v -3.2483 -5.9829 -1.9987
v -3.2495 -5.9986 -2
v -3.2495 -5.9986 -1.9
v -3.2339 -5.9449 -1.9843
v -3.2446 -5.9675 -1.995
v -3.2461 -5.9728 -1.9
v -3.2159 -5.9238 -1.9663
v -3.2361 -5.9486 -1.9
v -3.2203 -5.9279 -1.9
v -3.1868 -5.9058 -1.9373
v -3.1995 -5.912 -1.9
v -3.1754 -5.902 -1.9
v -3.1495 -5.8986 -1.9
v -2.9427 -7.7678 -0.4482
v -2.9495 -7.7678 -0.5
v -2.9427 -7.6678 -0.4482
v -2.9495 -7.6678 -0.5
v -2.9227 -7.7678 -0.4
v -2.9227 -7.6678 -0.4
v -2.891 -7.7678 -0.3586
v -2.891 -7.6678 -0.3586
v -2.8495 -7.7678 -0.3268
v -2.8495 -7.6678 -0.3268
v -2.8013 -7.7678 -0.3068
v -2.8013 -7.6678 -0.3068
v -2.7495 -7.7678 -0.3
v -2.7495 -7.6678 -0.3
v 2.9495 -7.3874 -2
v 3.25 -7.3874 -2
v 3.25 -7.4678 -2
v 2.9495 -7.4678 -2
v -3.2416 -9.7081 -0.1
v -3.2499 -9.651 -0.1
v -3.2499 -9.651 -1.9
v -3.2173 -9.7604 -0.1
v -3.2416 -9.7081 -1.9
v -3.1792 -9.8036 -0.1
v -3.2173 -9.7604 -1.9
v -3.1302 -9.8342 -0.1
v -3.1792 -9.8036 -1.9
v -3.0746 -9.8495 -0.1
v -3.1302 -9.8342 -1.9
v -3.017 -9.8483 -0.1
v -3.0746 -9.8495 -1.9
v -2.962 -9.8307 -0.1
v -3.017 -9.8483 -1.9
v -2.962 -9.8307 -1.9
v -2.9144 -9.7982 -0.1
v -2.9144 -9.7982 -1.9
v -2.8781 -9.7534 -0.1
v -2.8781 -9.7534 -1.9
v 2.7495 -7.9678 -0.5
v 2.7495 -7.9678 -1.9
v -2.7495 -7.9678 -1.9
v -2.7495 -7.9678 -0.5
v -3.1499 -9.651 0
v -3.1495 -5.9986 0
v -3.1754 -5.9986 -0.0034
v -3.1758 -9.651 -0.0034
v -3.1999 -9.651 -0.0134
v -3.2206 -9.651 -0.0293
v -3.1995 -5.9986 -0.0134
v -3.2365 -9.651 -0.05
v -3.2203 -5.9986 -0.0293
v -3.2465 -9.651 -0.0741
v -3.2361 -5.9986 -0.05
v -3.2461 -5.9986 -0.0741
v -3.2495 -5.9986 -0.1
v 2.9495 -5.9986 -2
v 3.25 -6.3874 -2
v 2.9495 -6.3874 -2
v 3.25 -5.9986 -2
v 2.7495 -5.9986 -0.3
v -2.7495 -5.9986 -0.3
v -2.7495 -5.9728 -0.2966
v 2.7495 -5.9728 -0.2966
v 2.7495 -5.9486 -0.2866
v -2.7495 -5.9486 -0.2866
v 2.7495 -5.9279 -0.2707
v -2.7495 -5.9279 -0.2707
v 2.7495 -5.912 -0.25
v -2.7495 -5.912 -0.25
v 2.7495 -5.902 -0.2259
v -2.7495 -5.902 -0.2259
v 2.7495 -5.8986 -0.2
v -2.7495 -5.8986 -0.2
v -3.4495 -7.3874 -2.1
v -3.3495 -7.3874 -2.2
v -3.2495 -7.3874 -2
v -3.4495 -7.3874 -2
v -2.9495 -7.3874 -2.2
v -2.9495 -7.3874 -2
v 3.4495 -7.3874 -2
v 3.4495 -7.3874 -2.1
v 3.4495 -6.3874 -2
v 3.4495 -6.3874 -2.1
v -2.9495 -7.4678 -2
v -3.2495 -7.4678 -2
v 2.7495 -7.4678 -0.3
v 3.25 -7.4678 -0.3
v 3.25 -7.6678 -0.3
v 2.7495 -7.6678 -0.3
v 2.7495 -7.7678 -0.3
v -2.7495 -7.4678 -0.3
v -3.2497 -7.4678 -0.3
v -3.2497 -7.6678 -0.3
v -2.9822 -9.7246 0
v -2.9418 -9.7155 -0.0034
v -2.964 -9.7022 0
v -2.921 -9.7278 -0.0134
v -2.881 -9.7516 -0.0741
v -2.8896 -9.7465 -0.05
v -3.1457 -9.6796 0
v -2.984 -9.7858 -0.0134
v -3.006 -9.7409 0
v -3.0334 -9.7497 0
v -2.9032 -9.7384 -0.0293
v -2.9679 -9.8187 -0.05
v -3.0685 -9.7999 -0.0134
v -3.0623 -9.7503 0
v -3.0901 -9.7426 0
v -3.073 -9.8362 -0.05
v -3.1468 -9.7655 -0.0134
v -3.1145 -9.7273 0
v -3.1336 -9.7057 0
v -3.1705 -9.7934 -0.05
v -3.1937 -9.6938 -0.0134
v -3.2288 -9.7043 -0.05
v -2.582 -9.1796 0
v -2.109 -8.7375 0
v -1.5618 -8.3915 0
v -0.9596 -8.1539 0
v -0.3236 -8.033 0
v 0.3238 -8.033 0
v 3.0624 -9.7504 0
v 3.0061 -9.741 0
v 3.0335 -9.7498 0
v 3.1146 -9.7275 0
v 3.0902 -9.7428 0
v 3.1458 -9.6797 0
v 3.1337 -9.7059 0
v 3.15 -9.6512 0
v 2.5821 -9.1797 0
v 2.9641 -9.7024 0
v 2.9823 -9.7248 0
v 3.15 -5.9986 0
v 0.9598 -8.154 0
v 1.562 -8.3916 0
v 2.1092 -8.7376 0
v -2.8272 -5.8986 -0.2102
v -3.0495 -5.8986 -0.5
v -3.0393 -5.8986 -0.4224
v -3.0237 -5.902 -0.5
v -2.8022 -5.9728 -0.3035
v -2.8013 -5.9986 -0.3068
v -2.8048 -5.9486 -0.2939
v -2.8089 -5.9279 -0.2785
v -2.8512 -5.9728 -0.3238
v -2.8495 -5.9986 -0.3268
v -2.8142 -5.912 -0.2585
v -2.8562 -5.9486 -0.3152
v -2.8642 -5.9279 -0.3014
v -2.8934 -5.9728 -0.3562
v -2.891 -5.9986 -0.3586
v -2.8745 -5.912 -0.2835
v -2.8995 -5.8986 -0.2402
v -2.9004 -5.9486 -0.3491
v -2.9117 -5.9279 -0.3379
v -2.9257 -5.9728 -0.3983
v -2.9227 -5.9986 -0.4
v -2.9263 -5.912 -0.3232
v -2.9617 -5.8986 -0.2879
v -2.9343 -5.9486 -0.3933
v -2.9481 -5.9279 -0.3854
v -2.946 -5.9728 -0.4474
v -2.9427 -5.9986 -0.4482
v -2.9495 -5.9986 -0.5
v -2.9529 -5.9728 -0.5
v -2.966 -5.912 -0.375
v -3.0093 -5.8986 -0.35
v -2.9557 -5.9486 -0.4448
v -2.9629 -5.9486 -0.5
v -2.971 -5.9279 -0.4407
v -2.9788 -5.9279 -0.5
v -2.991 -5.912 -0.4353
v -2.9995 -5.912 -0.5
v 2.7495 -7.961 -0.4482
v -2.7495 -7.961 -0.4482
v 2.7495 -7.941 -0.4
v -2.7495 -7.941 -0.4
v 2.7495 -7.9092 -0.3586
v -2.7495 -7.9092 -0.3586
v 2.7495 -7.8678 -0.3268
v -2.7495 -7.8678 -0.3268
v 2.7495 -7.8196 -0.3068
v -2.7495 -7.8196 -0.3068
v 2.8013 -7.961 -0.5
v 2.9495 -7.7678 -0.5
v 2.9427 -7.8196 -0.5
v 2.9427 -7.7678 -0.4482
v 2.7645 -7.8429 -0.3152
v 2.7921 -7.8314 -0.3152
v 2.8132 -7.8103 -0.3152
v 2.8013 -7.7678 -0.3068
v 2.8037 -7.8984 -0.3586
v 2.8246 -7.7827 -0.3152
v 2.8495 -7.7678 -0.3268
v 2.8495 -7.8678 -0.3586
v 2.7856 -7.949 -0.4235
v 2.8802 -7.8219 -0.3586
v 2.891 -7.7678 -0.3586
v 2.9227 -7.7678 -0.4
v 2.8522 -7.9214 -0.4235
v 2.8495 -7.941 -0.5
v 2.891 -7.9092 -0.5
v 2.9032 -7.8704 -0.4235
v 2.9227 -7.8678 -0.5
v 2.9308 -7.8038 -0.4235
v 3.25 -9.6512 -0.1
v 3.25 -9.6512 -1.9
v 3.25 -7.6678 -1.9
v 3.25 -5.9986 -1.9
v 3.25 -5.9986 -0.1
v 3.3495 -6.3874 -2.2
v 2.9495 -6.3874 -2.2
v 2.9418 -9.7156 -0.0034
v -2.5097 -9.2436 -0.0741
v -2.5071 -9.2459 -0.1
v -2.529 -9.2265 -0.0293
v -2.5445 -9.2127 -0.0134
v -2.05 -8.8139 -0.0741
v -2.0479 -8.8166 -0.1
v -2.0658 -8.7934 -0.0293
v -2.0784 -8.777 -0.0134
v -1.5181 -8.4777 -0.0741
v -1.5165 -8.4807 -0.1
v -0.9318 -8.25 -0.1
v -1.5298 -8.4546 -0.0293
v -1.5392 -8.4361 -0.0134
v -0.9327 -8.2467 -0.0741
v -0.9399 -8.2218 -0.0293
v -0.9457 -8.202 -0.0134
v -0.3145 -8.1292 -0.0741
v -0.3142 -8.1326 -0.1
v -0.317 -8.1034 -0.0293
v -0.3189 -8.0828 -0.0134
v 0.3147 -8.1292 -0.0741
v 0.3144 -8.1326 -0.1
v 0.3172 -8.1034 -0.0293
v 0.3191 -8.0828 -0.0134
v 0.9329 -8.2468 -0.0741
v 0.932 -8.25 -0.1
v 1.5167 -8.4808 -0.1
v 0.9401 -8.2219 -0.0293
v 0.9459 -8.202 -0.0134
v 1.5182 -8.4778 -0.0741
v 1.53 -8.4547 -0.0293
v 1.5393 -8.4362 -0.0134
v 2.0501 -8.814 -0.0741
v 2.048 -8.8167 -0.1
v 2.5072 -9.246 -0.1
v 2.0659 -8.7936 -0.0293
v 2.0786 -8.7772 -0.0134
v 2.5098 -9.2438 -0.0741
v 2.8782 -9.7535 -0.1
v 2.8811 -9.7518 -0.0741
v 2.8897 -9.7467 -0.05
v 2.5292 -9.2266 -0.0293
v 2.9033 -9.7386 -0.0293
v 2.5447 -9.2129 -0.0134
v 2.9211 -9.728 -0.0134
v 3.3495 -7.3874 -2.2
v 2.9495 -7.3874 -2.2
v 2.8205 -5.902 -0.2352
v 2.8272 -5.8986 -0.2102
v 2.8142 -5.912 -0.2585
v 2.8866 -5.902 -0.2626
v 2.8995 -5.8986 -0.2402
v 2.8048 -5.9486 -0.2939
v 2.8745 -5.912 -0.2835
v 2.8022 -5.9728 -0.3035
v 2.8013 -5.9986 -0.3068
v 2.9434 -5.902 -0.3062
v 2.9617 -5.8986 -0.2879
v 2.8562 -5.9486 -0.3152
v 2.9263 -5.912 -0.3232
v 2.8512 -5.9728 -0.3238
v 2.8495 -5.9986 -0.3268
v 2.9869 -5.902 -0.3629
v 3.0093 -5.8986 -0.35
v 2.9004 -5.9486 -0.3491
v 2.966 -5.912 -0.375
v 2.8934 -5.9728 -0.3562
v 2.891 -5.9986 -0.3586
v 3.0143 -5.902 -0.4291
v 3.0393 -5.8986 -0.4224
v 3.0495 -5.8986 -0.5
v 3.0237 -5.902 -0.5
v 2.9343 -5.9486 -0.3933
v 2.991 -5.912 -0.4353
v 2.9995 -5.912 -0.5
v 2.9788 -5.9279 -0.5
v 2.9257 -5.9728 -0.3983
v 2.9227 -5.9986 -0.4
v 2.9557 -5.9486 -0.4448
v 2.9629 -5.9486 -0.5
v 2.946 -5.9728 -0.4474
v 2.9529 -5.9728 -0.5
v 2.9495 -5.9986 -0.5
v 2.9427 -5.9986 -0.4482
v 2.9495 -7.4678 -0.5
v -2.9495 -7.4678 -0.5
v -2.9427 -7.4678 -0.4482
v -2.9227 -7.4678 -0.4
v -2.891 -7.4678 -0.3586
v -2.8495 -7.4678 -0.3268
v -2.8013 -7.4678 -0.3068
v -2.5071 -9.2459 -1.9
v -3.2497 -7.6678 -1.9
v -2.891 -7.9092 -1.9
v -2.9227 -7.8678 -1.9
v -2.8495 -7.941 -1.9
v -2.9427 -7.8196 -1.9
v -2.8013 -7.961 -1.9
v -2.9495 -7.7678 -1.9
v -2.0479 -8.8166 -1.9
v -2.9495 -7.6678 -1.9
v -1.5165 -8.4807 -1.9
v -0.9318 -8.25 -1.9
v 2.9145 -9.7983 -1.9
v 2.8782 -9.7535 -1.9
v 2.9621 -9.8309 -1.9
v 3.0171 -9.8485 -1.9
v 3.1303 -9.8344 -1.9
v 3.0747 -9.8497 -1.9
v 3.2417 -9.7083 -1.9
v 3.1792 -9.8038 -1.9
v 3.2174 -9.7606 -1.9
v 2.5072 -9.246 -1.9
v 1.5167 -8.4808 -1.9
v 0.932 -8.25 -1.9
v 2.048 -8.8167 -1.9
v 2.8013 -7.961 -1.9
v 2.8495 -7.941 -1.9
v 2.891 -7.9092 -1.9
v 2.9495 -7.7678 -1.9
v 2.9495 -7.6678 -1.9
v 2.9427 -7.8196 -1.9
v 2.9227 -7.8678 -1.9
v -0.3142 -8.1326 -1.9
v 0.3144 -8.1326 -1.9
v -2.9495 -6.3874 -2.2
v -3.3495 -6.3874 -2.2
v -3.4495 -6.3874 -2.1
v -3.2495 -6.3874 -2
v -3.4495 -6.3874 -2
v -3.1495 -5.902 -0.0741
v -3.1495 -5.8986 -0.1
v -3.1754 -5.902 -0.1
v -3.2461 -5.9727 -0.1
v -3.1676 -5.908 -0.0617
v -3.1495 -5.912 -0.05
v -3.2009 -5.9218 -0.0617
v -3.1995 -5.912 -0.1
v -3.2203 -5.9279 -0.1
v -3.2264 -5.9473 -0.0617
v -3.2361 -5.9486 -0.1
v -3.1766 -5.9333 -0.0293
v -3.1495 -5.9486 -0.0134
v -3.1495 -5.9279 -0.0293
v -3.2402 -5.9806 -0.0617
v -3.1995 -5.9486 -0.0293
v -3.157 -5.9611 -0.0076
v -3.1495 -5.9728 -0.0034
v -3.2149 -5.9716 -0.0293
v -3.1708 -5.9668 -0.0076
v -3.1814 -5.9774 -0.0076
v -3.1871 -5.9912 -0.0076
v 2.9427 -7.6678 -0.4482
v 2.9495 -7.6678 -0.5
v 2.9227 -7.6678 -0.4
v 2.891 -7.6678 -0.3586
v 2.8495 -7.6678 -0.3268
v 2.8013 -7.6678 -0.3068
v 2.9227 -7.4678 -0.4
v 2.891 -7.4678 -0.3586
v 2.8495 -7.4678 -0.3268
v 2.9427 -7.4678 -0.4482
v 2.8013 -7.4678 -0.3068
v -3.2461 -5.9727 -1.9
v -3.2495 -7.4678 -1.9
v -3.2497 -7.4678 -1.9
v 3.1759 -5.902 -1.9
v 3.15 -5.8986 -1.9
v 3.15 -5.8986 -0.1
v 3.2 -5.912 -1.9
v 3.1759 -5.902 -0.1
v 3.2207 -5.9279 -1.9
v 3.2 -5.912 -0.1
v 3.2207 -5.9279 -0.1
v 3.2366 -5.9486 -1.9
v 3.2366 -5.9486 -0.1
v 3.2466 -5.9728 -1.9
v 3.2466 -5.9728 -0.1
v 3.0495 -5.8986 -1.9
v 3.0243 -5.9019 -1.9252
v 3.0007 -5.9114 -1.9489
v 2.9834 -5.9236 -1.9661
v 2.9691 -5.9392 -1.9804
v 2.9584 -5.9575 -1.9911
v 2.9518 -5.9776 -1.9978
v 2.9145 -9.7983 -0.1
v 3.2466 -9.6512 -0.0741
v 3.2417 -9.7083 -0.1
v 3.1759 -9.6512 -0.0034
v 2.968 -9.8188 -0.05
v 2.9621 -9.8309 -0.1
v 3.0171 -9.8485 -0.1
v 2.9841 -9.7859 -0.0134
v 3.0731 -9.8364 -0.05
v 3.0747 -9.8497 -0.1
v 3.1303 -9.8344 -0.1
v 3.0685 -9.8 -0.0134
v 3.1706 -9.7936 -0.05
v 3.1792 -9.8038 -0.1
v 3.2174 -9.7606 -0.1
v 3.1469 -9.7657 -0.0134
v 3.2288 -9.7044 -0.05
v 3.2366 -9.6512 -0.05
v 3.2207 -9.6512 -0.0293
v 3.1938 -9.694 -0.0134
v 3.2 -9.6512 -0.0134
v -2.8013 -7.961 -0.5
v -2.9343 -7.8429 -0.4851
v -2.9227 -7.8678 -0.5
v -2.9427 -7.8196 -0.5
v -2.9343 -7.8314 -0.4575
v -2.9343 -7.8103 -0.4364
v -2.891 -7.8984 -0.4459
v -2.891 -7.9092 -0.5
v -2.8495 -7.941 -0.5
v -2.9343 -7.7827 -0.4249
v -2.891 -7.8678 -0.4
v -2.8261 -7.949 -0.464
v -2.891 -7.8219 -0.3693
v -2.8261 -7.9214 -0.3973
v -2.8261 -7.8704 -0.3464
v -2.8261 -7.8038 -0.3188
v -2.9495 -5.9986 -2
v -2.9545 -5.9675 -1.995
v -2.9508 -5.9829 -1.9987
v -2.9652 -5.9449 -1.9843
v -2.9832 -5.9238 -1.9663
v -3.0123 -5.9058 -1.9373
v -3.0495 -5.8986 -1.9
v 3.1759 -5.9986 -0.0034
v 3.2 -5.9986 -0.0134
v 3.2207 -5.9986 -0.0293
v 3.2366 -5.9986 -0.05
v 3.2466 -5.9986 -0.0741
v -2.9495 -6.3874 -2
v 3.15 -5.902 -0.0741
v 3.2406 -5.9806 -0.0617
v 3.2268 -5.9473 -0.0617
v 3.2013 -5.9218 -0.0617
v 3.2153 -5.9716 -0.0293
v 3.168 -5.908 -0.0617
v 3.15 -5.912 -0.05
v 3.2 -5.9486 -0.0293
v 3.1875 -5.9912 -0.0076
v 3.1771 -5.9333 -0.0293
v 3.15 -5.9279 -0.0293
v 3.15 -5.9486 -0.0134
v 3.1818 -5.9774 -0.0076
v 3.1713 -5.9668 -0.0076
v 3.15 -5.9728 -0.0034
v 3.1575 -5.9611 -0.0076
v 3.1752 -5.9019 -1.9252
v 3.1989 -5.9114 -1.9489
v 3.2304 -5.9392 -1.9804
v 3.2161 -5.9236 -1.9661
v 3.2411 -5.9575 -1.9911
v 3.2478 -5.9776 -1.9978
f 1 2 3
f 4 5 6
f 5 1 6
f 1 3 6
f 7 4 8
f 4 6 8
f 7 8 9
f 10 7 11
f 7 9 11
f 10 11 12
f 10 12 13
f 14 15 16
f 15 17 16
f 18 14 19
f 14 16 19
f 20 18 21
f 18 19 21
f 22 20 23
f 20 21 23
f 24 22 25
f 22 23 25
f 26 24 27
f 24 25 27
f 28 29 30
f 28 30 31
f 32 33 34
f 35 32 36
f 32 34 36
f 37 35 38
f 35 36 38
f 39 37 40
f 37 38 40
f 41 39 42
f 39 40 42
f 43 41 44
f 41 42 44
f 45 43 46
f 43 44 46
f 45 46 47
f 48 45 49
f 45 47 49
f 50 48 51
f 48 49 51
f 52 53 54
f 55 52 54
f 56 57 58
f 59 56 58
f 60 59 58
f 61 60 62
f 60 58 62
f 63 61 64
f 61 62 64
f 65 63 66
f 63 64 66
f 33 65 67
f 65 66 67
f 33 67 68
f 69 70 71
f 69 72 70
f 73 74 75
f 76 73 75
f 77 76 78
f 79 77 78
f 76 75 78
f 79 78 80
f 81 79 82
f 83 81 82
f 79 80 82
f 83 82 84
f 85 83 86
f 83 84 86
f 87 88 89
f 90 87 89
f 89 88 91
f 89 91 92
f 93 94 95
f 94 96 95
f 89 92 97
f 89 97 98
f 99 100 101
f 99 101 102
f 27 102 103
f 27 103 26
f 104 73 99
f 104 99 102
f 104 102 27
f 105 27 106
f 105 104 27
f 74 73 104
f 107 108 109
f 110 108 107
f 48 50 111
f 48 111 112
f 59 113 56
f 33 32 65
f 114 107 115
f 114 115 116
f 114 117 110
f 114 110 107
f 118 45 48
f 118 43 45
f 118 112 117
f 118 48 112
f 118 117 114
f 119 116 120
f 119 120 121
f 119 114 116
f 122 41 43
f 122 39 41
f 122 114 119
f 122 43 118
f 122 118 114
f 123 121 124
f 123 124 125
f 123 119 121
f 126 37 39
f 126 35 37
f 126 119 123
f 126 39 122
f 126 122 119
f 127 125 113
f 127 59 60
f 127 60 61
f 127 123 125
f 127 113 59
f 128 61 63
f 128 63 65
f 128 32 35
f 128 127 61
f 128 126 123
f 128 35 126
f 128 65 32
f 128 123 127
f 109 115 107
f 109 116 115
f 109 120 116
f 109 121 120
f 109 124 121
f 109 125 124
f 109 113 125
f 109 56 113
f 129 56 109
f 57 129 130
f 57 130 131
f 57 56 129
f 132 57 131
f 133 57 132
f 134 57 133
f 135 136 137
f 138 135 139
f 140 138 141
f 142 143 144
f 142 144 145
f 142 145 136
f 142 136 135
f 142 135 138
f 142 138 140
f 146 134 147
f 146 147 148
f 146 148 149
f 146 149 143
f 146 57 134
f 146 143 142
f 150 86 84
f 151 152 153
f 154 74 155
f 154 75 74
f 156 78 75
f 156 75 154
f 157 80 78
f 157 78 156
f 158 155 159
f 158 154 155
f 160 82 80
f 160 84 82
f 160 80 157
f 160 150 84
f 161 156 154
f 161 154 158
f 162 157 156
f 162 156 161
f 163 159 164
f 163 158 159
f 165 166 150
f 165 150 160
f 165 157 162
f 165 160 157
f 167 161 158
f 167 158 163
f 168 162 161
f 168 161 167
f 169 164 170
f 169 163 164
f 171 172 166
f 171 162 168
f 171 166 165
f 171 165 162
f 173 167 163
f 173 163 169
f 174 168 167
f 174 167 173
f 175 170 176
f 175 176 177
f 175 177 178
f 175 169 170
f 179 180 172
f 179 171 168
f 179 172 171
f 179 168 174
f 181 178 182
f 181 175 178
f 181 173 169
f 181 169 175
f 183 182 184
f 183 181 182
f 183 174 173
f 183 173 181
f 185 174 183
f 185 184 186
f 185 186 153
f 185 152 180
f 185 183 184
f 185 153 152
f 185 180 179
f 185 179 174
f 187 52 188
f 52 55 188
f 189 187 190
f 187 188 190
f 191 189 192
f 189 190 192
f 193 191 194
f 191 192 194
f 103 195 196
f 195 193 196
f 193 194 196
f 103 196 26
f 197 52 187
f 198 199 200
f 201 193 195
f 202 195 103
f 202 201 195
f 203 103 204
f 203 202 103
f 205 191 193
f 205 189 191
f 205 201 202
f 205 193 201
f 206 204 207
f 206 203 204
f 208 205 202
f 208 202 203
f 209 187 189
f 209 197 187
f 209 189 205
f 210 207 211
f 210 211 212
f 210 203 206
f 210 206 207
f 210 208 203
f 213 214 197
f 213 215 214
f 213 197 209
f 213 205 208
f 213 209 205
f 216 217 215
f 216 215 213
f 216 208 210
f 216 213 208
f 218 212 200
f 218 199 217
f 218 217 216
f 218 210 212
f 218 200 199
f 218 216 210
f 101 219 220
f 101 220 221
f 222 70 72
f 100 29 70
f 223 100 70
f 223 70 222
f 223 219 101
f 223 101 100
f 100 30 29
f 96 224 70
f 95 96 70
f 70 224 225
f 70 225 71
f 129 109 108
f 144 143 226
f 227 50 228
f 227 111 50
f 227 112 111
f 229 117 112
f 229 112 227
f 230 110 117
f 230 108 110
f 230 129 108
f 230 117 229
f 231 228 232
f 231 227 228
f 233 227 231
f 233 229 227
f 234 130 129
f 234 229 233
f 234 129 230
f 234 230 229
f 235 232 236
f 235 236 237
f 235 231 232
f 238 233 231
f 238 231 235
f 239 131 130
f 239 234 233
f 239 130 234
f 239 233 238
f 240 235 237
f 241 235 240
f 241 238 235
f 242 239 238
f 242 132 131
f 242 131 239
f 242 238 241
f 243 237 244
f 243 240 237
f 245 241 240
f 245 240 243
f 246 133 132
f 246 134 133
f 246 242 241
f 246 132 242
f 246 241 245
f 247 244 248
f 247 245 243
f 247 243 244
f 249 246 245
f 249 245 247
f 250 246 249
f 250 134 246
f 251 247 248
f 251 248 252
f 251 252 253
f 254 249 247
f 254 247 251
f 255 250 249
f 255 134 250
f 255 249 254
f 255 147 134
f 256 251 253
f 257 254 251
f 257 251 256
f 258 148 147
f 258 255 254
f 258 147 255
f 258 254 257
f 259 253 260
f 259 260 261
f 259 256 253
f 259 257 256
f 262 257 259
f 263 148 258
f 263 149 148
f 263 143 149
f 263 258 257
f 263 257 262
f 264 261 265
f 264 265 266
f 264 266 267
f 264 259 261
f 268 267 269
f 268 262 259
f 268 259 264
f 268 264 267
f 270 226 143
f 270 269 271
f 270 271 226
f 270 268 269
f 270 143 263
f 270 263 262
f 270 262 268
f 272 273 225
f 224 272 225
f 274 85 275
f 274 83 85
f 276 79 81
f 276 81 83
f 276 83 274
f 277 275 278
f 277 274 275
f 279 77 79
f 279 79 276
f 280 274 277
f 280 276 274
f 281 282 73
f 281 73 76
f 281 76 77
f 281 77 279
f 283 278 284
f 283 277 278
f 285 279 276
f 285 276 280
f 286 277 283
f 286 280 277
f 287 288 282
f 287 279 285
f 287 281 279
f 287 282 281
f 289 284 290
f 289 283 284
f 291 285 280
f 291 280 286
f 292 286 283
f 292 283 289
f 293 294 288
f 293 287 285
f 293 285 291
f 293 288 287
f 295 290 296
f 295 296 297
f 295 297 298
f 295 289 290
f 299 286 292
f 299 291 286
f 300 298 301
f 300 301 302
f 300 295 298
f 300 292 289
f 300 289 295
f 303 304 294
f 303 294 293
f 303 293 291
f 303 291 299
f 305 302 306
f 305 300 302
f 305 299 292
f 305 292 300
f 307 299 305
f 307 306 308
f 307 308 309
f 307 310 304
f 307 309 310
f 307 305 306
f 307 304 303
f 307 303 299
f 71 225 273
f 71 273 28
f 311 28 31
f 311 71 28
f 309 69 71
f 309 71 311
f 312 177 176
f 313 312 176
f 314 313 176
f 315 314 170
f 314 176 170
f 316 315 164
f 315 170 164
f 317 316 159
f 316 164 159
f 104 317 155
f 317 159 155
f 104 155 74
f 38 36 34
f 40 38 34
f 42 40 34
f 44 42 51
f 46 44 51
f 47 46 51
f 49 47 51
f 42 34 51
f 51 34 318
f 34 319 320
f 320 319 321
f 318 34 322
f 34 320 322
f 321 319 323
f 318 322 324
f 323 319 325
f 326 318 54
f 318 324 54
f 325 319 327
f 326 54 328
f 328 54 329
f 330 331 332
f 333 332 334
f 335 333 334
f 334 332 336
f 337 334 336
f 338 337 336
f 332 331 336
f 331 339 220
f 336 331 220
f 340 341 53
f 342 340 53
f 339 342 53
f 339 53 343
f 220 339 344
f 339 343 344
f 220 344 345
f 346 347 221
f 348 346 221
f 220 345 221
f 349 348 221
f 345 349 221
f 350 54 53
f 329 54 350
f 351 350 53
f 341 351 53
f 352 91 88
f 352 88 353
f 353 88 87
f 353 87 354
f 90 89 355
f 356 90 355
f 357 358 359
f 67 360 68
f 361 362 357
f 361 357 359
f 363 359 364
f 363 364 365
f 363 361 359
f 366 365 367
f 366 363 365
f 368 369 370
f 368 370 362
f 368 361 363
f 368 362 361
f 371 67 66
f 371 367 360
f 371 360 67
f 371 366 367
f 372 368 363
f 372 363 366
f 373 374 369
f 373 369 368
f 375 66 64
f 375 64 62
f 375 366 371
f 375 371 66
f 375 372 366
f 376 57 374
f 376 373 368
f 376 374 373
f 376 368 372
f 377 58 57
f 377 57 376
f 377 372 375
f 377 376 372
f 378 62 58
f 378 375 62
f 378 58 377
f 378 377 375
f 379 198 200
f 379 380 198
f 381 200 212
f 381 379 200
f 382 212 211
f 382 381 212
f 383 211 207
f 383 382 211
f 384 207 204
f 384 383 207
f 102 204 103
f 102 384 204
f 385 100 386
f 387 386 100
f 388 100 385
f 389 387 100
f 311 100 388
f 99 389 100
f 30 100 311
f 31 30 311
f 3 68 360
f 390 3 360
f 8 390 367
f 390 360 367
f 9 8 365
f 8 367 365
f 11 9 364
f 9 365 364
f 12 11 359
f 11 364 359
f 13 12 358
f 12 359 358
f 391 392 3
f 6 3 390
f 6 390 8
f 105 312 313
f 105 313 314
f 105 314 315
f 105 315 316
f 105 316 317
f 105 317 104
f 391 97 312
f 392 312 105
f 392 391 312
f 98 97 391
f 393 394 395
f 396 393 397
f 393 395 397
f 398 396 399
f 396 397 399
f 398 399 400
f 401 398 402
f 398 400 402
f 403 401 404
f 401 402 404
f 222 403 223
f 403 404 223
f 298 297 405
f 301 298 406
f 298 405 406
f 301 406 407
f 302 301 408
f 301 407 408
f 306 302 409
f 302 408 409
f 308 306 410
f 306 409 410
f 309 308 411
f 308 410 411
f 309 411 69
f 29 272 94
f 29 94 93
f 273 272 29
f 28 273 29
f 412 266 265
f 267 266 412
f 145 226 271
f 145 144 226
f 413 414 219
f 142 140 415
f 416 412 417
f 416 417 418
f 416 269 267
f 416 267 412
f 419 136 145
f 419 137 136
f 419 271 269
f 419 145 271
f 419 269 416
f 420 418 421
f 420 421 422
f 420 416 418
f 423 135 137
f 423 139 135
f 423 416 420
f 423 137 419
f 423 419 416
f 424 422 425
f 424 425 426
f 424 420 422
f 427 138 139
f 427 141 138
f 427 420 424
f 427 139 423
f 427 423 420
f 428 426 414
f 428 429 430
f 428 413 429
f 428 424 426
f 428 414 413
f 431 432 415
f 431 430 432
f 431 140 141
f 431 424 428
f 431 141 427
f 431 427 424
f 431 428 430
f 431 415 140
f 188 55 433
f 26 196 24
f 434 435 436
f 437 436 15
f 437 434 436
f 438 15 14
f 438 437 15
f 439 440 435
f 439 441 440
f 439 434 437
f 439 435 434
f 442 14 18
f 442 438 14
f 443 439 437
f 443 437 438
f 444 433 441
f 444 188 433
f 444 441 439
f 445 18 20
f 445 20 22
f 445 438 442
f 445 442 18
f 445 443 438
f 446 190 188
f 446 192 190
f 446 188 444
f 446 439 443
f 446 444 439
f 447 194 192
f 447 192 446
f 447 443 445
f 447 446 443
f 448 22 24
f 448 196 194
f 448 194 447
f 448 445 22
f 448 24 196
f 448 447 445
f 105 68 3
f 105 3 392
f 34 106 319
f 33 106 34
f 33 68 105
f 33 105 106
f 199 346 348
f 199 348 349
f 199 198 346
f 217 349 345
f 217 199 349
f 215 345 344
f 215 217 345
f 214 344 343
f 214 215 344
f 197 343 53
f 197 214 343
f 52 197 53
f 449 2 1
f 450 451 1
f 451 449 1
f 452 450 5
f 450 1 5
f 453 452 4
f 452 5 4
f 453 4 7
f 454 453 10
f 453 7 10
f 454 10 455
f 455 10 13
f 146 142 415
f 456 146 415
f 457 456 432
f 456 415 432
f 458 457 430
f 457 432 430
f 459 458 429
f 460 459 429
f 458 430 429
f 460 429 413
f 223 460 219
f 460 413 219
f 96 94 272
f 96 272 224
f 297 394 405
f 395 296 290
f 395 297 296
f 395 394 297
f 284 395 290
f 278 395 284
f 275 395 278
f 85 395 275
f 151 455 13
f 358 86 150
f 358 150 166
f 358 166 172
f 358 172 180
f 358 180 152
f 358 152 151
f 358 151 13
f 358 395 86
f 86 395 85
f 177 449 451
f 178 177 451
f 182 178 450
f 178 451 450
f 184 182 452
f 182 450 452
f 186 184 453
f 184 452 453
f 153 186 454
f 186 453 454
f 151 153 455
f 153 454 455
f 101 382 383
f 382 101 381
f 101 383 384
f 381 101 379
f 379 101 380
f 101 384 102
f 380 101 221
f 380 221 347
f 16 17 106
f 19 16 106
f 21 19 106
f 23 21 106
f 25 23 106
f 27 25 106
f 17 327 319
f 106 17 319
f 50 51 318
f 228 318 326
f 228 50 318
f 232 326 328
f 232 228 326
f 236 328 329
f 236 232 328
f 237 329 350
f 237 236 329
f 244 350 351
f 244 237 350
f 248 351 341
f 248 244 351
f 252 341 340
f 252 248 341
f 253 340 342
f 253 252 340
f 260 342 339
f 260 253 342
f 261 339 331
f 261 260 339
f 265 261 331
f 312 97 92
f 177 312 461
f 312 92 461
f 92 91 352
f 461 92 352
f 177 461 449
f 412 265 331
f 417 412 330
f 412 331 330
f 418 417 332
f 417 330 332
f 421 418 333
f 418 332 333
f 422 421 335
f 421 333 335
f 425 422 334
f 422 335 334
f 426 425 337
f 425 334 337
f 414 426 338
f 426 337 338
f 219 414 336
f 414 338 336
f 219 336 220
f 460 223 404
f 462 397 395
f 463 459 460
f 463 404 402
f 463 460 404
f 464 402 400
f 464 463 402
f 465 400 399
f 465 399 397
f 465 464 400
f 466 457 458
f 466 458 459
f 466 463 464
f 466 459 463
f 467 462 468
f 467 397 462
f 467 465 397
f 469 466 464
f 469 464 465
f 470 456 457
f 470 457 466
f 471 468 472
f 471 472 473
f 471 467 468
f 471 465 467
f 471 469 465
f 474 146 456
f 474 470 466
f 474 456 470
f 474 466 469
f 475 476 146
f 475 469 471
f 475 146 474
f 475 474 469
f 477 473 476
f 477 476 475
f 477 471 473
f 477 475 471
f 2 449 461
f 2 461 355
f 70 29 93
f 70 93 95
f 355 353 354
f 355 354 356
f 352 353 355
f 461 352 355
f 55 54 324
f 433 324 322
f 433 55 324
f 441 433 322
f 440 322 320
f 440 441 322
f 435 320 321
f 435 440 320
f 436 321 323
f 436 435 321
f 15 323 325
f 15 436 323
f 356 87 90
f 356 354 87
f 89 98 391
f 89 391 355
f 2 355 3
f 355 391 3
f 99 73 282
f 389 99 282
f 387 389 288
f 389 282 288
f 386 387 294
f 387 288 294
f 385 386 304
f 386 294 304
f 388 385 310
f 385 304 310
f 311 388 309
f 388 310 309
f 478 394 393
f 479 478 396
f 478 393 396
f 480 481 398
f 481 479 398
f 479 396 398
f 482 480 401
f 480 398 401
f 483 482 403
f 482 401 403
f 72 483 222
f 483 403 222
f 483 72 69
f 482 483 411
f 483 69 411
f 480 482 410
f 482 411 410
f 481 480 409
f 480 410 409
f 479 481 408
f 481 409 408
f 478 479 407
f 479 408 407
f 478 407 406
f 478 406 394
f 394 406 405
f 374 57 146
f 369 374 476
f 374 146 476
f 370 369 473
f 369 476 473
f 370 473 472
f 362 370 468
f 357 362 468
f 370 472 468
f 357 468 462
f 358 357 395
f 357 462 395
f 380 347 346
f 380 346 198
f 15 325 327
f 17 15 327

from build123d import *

# Parameters (mm, degrees)
BOSS_EXTRUDE1_DEPTH = 1.9
SKETCH2_W           = 6.499536779
SKETCH2_H           = 1.569153834
BOSS_EXTRUDE2_DEPTH = 0.1
BOSS_EXTRUDE3_START = -0.3
SKETCH3_W           = 0.2
SKETCH3_H           = 1
BOSS_EXTRUDE3_DEPTH = 0.5
SKETCH4_W           = 5.899073558
SKETCH4_H           = 2.069153834
CUT_EXTRUDE1_DEPTH  = 1.7
CHAMFER1_SIZE       = 0.1
SKETCH5_W           = 0.32618924
SKETCH5_H           = 0.2
CUT_EXTRUDE2_DEPTH  = 1.6
FILLET1_R           = 0.2
FILLET2_R           = 0.2
FILLET3_R           = 0.1


with BuildPart() as part:
    # Sketch1 → Boss-Extrude1 (new body)
    with BuildSketch(Plane.XY):
        with BuildLine():
            Line((3.25, -5.898632739), (-3.249536779, -5.898632739))
            Line((-3.249536779, -5.898632739), (-3.25, -10.655382732))
            ThreePointArc((-3.25, -10.655382732), (0, -8.117786573), (3.25, -10.655382732))
            Line((3.25, -10.655382732), (3.25, -5.898632739))
        make_face()
    extrude(amount=-BOSS_EXTRUDE1_DEPTH)

    # Sketch2 → Boss-Extrude2 (add)
    with BuildSketch(Plane(origin=(0, 0, -1.9), x_dir=(-1, 0, 0), z_dir=(0, 0, -1))):
        with Locations((-0.00023161, -6.683209656)):
            Rectangle(SKETCH2_W, SKETCH2_H)
    extrude(amount=BOSS_EXTRUDE2_DEPTH)

    # Sketch3 → Boss-Extrude3 (add)
    with BuildSketch(Plane.ZY.offset(3.249536779).offset(BOSS_EXTRUDE3_START)):
        with Locations((-2.1, -6.887362902)):
            Rectangle(SKETCH3_W, SKETCH3_H)
    boss_extrude3 = extrude(amount=BOSS_EXTRUDE3_DEPTH)

    # Mirror1: Boss-Extrude3 across plane
    add(boss_extrude3.mirror(Plane(origin=(0, 0, 0), x_dir=(0, 0, 1), z_dir=(1, 0, 0))))

    # Sketch4 → Cut-Extrude1 (cut)
    with BuildSketch(Plane(origin=(0, 0, -2), x_dir=(-1, 0, 0), z_dir=(0, 0, -1))):
        with Locations((0, -6.933209656)):
            Rectangle(SKETCH4_W, SKETCH4_H)
    extrude(amount=-CUT_EXTRUDE1_DEPTH, mode=Mode.SUBTRACT)

    # Chamfer1
    chamfer1_edges = [part.edges().sort_by_distance(p)[0] for p in [
        (-3.449536779, -6.887362902, -2.2),
        (3.449536779, -6.887362902, -2.2),
    ]]
    chamfer(chamfer1_edges, length=CHAMFER1_SIZE)

    # Sketch5 → Cut-Extrude2 (cut)
    with BuildSketch(Plane(origin=(0, 0, -1.9), x_dir=(-1, 0, 0), z_dir=(0, 0, -1))):
        with Locations((3.112631399, -7.567786573)):
            Rectangle(SKETCH5_W, SKETCH5_H)
        with Locations((-3.112631399, -7.567786573)):
            Rectangle(SKETCH5_W, SKETCH5_H)
    extrude(amount=-CUT_EXTRUDE2_DEPTH, mode=Mode.SUBTRACT)

    # Fillet1
    fillet1_edges = [part.edges().sort_by_distance(p)[0] for p in [
        (2.949536779, -6.683209656, -0.3),
        (2.949536779, -7.967786573, -1.1),
        (0, -7.967786573, -0.3),
        (-2.949536779, -7.967786573, -1.1),
        (-2.949536779, -7.817786573, -0.3),
        (-2.949536779, -6.683209656, -0.3),
        (2.949536779, -7.817786573, -0.3),
    ]]
    fillet(fillet1_edges, radius=FILLET1_R)

    # Fillet2
    fillet2_edges = [part.edges().sort_by_distance(p)[0] for p in [
        (-3.25, -10.655382732, -0.95),
        (3.25, -10.655382732, -0.95),
    ]]
    fillet(fillet2_edges, radius=FILLET2_R)

    # Fillet3
    # the kernel refuses this fillet: 0.1 mm, written as the material it takes off along each edge
    with BuildSketch(Plane(origin=(3.15, -5.998632739, -0.1), x_dir=(1, 0, 0), z_dir=(0, 0, 1))) as fillet3_piece_1_section:
        Polygon((0, 0), (FILLET3_R, 0), (FILLET3_R, FILLET3_R), (0, FILLET3_R), align=None)
    fillet3_piece_1 = extrude(amount=FILLET3_R, mode=Mode.PRIVATE)
    fillet3_piece_1 = fillet3_piece_1 - Plane(origin=(3.15, -5.998632739, -0.1), x_dir=(-0.7071067811865476, -0.7071067811865475, 0), z_dir=(0, 0, 1)) * Sphere(FILLET3_R, mode=Mode.PRIVATE)
    add(fillet3_piece_1, mode=Mode.SUBTRACT)
    with BuildSketch(Plane(origin=(-3.149546516, -5.998632739, -0.1), x_dir=(0, 1, 0), z_dir=(0, 0, 1))) as fillet3_piece_2_section:
        Polygon((0, 0), (FILLET3_R, 0), (FILLET3_R, FILLET3_R * 0.999902622813), (FILLET3_R * 9.738192815e-05, FILLET3_R * 0.999999995258), align=None)
    fillet3_piece_2 = extrude(amount=FILLET3_R, mode=Mode.PRIVATE)
    fillet3_piece_2 = fillet3_piece_2 - Plane(origin=(-3.149546516, -5.998632739, -0.1), x_dir=(0.7070723506374189, -0.7071412100592604, 0), z_dir=(0, 0, 1)) * Sphere(FILLET3_R, mode=Mode.PRIVATE)
    add(fillet3_piece_2, mode=Mode.SUBTRACT)
    with BuildSketch(Plane(origin=(3.25, -9.65119636, 0), x_dir=(-1, 0, 0), z_dir=(0, 1, 0))) as fillet3_piece_3:
        with BuildLine():
            CenterArc((FILLET3_R, -FILLET3_R), FILLET3_R, 90, 90)
            Line((0, -FILLET3_R), (0, 0))
            Line((0, 0), (FILLET3_R, 0))
        make_face()
    extrude(amount=3.652563621, mode=Mode.SUBTRACT)
    with BuildSketch(Plane(origin=(3.05, -9.65119636, 0), x_dir=(-0.8591549295774534, -0.511715552805229, 0), z_dir=(-0.511715552805229, 0.8591549295774534, 0))) as fillet3_piece_4:
        with BuildLine():
            CenterArc((0.2 - FILLET3_R, -FILLET3_R), FILLET3_R, 0, 90)
            Line((0.2, -FILLET3_R), (0.2, 0))
            Line((0.2, 0), (0.2 - FILLET3_R, 0))
        make_face()
    revolve(axis=Axis((3.05, -9.65119636, 0), (0, 0, 1)), revolution_arc=149.221830438, mode=Mode.SUBTRACT)
    with BuildSketch(Plane(origin=(0, -11.467786573, 0), x_dir=(-0.8591273784381983, 0.5117618075021901, 0), z_dir=(-0.5117618075021901, -0.8591273784381983, 0))) as fillet3_piece_5:
        with BuildLine():
            CenterArc((3.35 + FILLET3_R, FILLET3_R), FILLET3_R, 180, 90)
            Line((3.35, FILLET3_R), (3.35, 0))
            Line((3.35, 0), (3.35 + FILLET3_R, 0))
        make_face()
    revolve(axis=Axis((0, -11.467786573, 0), (0, 0, -1)), revolution_arc=118.440576169, mode=Mode.SUBTRACT)
    with BuildSketch(Plane(origin=(-3.049902193, -9.651032156, 0), x_dir=(0.8591273784382029, -0.5117618075021826, 0), z_dir=(0.5117618075021826, 0.8591273784382029, 0))) as fillet3_piece_6:
        with BuildLine():
            CenterArc((0.2 - FILLET3_R, FILLET3_R), FILLET3_R, 270, 90)
            Line((0.2, FILLET3_R), (0.2, 0))
            Line((0.2, 0), (0.2 - FILLET3_R, 0))
        make_face()
    revolve(axis=Axis((-3.049902193, -9.651032156, 0), (0, 0, -1)), revolution_arc=149.224325304, mode=Mode.SUBTRACT)
    with BuildSketch(Plane(origin=(-3.249546516, -5.998623001, 0), x_dir=(0.99999999525838, -9.738192814999169e-05, 0), z_dir=(-9.73819281499917e-05, -0.9999999952583801, 0))) as fillet3_piece_7:
        with BuildLine():
            CenterArc((FILLET3_R, -FILLET3_R), FILLET3_R, 90, 90)
            Line((0, -FILLET3_R), (0, 0))
            Line((0, 0), (FILLET3_R, 0))
        make_face()
    extrude(amount=3.652389696, mode=Mode.SUBTRACT)
    with BuildSketch(Plane(origin=(3.25, -5.898632739, -0.1), x_dir=(0, -1, 0), z_dir=(0, 0, -1))) as fillet3_piece_8:
        with BuildLine():
            CenterArc((FILLET3_R, FILLET3_R), FILLET3_R, 180, 90)
            Line((0, FILLET3_R), (0, 0))
            Line((0, 0), (FILLET3_R, 0))
        make_face()
    extrude(amount=1.8, mode=Mode.SUBTRACT)
    with BuildSketch(Plane(origin=(3.15, -5.898632739, 0), x_dir=(0, -1, 0), z_dir=(-1, 0, 0))) as fillet3_piece_9:
        with BuildLine():
            CenterArc((FILLET3_R, -FILLET3_R), FILLET3_R, 90, 90)
            Line((0, -FILLET3_R), (0, 0))
            Line((0, 0), (FILLET3_R, 0))
        make_face()
    extrude(amount=6.299546516, mode=Mode.SUBTRACT)
    with BuildSketch(Plane(origin=(-3.249536779, -5.898632739, -0.1), x_dir=(1, 0, 0), z_dir=(0, 0, -1))) as fillet3_piece_10:
        with BuildLine():
            CenterArc((FILLET3_R * 0.999902622813, FILLET3_R), FILLET3_R, 180.005579573, 89.994420427)
            Line((-FILLET3_R * 9.73724453734e-05, FILLET3_R * 0.999902618072), (0, 0))
            Line((0, 0), (FILLET3_R * 0.999902622813, 0))
        make_face()
    extrude(amount=1.8, mode=Mode.SUBTRACT)
    with BuildSketch(Plane(origin=(-3.249536779, -5.898632739, -1.9), x_dir=(1.0, -4.7416204296268874e-09, 0), z_dir=(0, 0, -1)), Plane(origin=(3.25, -5.898632739, -1.9), x_dir=(0, -1, 0), z_dir=(0, 0, -1))) as fillet3_piece_11:
        with BuildLine():
            CenterArc((FILLET3_R * 1.00000000474, FILLET3_R), FILLET3_R, 179.999999728, 90)
            Line((FILLET3_R * 4.74162045211e-09, FILLET3_R * 1.00000000474), (0, 0))
            Line((0, 0), (FILLET3_R, 0))
        make_face()
    extrude(amount=0.350000001, mode=Mode.SUBTRACT)
    with BuildSketch(Plane(origin=(-3.49953678, -5.898632739, -2), x_dir=(0, -4.7416204296268874e-09, 1.0), z_dir=(1, 0, 0))) as fillet3_piece_12:
        with BuildLine():
            CenterArc((FILLET3_R * 1.00000000474, FILLET3_R), FILLET3_R, 179.999999728, 90)
            Line((FILLET3_R * 4.74162045211e-09, FILLET3_R * 1.00000000474), (0, 0))
            Line((0, 0), (FILLET3_R, 0))
        make_face()
    extrude(amount=0.800000002, mode=Mode.SUBTRACT)
    with BuildSketch(Plane(origin=(-2.949536779, -5.898632739, -2.250000001), x_dir=(-1.0, -4.7416204296268874e-09, 0), z_dir=(0, 0, 1))) as fillet3_piece_13:
        with BuildLine():
            CenterArc((FILLET3_R * 1.00000000474, FILLET3_R), FILLET3_R, 179.999999728, 90)
            Line((FILLET3_R * 4.74162045211e-09, FILLET3_R * 1.00000000474), (0, 0))
            Line((0, 0), (FILLET3_R, 0))
        make_face()
    extrude(amount=1.750000001, mode=Mode.SUBTRACT)
    with BuildSketch(Plane(origin=(-2.749536779, -5.898632739, -0.5), x_dir=(0, 0, 1), z_dir=(1, 0, 0))) as fillet3_piece_14:
        with BuildLine():
            CenterArc((0.2 + FILLET3_R, FILLET3_R), FILLET3_R, 180, 90)
            Line((0.2, FILLET3_R), (0.2, 0))
            Line((0.2, 0), (0.2 + FILLET3_R, 0))
        make_face()
    revolve(axis=Axis((-2.749536779, -5.898632739, -0.5), (0, -1, 0)), revolution_arc=90, mode=Mode.SUBTRACT)
    with BuildSketch(Plane(origin=(-2.749536779, -5.898632739, -0.3), x_dir=(0, -4.7416204296268916e-09, 1.0), z_dir=(1, 0, 0))) as fillet3_piece_15:
        with BuildLine():
            CenterArc((FILLET3_R * 1.00000000474, FILLET3_R), FILLET3_R, 179.999999728, 90)
            Line((FILLET3_R * 4.74162045211e-09, FILLET3_R * 1.00000000474), (0, 0))
            Line((0, 0), (FILLET3_R, 0))
        make_face()
    extrude(amount=5.499073557, mode=Mode.SUBTRACT)
    with BuildSketch(Plane(origin=(2.749536779, -5.898632739, -0.5), x_dir=(0, 0, 1), z_dir=(-1, 0, 0))) as fillet3_piece_16:
        with BuildLine():
            CenterArc((0.2 + FILLET3_R, -FILLET3_R), FILLET3_R, 90, 90)
            Line((0.2, -FILLET3_R), (0.2, 0))
            Line((0.2, 0), (0.2 + FILLET3_R, 0))
        make_face()
    revolve(axis=Axis((2.749536779, -5.898632739, -0.5), (0, 1, 0)), revolution_arc=90, mode=Mode.SUBTRACT)
    with BuildSketch(Plane(origin=(2.949536779, -5.898632739, -2.250000001), x_dir=(1.0, -4.7416204296268874e-09, 0), z_dir=(0, 0, 1))) as fillet3_piece_17:
        with BuildLine():
            CenterArc((FILLET3_R * 1.00000000474, -FILLET3_R), FILLET3_R, 90.000000272, 90)
            Line((FILLET3_R * 4.74162045211e-09, -FILLET3_R * 1.00000000474), (0, 0))
            Line((0, 0), (FILLET3_R, 0))
        make_face()
    extrude(amount=1.750000001, mode=Mode.SUBTRACT)
    with BuildSketch(Plane(origin=(2.699536777, -5.898632739, -2), x_dir=(0, -4.7416204296268874e-09, 1.0), z_dir=(1, 0, 0))) as fillet3_piece_18:
        with BuildLine():
            CenterArc((FILLET3_R * 1.00000000474, FILLET3_R), FILLET3_R, 179.999999728, 90)
            Line((FILLET3_R * 4.74162045211e-09, FILLET3_R * 1.00000000474), (0, 0))
            Line((0, 0), (FILLET3_R, 0))
        make_face()
    extrude(amount=0.800463224, mode=Mode.SUBTRACT)


solid = part.part
